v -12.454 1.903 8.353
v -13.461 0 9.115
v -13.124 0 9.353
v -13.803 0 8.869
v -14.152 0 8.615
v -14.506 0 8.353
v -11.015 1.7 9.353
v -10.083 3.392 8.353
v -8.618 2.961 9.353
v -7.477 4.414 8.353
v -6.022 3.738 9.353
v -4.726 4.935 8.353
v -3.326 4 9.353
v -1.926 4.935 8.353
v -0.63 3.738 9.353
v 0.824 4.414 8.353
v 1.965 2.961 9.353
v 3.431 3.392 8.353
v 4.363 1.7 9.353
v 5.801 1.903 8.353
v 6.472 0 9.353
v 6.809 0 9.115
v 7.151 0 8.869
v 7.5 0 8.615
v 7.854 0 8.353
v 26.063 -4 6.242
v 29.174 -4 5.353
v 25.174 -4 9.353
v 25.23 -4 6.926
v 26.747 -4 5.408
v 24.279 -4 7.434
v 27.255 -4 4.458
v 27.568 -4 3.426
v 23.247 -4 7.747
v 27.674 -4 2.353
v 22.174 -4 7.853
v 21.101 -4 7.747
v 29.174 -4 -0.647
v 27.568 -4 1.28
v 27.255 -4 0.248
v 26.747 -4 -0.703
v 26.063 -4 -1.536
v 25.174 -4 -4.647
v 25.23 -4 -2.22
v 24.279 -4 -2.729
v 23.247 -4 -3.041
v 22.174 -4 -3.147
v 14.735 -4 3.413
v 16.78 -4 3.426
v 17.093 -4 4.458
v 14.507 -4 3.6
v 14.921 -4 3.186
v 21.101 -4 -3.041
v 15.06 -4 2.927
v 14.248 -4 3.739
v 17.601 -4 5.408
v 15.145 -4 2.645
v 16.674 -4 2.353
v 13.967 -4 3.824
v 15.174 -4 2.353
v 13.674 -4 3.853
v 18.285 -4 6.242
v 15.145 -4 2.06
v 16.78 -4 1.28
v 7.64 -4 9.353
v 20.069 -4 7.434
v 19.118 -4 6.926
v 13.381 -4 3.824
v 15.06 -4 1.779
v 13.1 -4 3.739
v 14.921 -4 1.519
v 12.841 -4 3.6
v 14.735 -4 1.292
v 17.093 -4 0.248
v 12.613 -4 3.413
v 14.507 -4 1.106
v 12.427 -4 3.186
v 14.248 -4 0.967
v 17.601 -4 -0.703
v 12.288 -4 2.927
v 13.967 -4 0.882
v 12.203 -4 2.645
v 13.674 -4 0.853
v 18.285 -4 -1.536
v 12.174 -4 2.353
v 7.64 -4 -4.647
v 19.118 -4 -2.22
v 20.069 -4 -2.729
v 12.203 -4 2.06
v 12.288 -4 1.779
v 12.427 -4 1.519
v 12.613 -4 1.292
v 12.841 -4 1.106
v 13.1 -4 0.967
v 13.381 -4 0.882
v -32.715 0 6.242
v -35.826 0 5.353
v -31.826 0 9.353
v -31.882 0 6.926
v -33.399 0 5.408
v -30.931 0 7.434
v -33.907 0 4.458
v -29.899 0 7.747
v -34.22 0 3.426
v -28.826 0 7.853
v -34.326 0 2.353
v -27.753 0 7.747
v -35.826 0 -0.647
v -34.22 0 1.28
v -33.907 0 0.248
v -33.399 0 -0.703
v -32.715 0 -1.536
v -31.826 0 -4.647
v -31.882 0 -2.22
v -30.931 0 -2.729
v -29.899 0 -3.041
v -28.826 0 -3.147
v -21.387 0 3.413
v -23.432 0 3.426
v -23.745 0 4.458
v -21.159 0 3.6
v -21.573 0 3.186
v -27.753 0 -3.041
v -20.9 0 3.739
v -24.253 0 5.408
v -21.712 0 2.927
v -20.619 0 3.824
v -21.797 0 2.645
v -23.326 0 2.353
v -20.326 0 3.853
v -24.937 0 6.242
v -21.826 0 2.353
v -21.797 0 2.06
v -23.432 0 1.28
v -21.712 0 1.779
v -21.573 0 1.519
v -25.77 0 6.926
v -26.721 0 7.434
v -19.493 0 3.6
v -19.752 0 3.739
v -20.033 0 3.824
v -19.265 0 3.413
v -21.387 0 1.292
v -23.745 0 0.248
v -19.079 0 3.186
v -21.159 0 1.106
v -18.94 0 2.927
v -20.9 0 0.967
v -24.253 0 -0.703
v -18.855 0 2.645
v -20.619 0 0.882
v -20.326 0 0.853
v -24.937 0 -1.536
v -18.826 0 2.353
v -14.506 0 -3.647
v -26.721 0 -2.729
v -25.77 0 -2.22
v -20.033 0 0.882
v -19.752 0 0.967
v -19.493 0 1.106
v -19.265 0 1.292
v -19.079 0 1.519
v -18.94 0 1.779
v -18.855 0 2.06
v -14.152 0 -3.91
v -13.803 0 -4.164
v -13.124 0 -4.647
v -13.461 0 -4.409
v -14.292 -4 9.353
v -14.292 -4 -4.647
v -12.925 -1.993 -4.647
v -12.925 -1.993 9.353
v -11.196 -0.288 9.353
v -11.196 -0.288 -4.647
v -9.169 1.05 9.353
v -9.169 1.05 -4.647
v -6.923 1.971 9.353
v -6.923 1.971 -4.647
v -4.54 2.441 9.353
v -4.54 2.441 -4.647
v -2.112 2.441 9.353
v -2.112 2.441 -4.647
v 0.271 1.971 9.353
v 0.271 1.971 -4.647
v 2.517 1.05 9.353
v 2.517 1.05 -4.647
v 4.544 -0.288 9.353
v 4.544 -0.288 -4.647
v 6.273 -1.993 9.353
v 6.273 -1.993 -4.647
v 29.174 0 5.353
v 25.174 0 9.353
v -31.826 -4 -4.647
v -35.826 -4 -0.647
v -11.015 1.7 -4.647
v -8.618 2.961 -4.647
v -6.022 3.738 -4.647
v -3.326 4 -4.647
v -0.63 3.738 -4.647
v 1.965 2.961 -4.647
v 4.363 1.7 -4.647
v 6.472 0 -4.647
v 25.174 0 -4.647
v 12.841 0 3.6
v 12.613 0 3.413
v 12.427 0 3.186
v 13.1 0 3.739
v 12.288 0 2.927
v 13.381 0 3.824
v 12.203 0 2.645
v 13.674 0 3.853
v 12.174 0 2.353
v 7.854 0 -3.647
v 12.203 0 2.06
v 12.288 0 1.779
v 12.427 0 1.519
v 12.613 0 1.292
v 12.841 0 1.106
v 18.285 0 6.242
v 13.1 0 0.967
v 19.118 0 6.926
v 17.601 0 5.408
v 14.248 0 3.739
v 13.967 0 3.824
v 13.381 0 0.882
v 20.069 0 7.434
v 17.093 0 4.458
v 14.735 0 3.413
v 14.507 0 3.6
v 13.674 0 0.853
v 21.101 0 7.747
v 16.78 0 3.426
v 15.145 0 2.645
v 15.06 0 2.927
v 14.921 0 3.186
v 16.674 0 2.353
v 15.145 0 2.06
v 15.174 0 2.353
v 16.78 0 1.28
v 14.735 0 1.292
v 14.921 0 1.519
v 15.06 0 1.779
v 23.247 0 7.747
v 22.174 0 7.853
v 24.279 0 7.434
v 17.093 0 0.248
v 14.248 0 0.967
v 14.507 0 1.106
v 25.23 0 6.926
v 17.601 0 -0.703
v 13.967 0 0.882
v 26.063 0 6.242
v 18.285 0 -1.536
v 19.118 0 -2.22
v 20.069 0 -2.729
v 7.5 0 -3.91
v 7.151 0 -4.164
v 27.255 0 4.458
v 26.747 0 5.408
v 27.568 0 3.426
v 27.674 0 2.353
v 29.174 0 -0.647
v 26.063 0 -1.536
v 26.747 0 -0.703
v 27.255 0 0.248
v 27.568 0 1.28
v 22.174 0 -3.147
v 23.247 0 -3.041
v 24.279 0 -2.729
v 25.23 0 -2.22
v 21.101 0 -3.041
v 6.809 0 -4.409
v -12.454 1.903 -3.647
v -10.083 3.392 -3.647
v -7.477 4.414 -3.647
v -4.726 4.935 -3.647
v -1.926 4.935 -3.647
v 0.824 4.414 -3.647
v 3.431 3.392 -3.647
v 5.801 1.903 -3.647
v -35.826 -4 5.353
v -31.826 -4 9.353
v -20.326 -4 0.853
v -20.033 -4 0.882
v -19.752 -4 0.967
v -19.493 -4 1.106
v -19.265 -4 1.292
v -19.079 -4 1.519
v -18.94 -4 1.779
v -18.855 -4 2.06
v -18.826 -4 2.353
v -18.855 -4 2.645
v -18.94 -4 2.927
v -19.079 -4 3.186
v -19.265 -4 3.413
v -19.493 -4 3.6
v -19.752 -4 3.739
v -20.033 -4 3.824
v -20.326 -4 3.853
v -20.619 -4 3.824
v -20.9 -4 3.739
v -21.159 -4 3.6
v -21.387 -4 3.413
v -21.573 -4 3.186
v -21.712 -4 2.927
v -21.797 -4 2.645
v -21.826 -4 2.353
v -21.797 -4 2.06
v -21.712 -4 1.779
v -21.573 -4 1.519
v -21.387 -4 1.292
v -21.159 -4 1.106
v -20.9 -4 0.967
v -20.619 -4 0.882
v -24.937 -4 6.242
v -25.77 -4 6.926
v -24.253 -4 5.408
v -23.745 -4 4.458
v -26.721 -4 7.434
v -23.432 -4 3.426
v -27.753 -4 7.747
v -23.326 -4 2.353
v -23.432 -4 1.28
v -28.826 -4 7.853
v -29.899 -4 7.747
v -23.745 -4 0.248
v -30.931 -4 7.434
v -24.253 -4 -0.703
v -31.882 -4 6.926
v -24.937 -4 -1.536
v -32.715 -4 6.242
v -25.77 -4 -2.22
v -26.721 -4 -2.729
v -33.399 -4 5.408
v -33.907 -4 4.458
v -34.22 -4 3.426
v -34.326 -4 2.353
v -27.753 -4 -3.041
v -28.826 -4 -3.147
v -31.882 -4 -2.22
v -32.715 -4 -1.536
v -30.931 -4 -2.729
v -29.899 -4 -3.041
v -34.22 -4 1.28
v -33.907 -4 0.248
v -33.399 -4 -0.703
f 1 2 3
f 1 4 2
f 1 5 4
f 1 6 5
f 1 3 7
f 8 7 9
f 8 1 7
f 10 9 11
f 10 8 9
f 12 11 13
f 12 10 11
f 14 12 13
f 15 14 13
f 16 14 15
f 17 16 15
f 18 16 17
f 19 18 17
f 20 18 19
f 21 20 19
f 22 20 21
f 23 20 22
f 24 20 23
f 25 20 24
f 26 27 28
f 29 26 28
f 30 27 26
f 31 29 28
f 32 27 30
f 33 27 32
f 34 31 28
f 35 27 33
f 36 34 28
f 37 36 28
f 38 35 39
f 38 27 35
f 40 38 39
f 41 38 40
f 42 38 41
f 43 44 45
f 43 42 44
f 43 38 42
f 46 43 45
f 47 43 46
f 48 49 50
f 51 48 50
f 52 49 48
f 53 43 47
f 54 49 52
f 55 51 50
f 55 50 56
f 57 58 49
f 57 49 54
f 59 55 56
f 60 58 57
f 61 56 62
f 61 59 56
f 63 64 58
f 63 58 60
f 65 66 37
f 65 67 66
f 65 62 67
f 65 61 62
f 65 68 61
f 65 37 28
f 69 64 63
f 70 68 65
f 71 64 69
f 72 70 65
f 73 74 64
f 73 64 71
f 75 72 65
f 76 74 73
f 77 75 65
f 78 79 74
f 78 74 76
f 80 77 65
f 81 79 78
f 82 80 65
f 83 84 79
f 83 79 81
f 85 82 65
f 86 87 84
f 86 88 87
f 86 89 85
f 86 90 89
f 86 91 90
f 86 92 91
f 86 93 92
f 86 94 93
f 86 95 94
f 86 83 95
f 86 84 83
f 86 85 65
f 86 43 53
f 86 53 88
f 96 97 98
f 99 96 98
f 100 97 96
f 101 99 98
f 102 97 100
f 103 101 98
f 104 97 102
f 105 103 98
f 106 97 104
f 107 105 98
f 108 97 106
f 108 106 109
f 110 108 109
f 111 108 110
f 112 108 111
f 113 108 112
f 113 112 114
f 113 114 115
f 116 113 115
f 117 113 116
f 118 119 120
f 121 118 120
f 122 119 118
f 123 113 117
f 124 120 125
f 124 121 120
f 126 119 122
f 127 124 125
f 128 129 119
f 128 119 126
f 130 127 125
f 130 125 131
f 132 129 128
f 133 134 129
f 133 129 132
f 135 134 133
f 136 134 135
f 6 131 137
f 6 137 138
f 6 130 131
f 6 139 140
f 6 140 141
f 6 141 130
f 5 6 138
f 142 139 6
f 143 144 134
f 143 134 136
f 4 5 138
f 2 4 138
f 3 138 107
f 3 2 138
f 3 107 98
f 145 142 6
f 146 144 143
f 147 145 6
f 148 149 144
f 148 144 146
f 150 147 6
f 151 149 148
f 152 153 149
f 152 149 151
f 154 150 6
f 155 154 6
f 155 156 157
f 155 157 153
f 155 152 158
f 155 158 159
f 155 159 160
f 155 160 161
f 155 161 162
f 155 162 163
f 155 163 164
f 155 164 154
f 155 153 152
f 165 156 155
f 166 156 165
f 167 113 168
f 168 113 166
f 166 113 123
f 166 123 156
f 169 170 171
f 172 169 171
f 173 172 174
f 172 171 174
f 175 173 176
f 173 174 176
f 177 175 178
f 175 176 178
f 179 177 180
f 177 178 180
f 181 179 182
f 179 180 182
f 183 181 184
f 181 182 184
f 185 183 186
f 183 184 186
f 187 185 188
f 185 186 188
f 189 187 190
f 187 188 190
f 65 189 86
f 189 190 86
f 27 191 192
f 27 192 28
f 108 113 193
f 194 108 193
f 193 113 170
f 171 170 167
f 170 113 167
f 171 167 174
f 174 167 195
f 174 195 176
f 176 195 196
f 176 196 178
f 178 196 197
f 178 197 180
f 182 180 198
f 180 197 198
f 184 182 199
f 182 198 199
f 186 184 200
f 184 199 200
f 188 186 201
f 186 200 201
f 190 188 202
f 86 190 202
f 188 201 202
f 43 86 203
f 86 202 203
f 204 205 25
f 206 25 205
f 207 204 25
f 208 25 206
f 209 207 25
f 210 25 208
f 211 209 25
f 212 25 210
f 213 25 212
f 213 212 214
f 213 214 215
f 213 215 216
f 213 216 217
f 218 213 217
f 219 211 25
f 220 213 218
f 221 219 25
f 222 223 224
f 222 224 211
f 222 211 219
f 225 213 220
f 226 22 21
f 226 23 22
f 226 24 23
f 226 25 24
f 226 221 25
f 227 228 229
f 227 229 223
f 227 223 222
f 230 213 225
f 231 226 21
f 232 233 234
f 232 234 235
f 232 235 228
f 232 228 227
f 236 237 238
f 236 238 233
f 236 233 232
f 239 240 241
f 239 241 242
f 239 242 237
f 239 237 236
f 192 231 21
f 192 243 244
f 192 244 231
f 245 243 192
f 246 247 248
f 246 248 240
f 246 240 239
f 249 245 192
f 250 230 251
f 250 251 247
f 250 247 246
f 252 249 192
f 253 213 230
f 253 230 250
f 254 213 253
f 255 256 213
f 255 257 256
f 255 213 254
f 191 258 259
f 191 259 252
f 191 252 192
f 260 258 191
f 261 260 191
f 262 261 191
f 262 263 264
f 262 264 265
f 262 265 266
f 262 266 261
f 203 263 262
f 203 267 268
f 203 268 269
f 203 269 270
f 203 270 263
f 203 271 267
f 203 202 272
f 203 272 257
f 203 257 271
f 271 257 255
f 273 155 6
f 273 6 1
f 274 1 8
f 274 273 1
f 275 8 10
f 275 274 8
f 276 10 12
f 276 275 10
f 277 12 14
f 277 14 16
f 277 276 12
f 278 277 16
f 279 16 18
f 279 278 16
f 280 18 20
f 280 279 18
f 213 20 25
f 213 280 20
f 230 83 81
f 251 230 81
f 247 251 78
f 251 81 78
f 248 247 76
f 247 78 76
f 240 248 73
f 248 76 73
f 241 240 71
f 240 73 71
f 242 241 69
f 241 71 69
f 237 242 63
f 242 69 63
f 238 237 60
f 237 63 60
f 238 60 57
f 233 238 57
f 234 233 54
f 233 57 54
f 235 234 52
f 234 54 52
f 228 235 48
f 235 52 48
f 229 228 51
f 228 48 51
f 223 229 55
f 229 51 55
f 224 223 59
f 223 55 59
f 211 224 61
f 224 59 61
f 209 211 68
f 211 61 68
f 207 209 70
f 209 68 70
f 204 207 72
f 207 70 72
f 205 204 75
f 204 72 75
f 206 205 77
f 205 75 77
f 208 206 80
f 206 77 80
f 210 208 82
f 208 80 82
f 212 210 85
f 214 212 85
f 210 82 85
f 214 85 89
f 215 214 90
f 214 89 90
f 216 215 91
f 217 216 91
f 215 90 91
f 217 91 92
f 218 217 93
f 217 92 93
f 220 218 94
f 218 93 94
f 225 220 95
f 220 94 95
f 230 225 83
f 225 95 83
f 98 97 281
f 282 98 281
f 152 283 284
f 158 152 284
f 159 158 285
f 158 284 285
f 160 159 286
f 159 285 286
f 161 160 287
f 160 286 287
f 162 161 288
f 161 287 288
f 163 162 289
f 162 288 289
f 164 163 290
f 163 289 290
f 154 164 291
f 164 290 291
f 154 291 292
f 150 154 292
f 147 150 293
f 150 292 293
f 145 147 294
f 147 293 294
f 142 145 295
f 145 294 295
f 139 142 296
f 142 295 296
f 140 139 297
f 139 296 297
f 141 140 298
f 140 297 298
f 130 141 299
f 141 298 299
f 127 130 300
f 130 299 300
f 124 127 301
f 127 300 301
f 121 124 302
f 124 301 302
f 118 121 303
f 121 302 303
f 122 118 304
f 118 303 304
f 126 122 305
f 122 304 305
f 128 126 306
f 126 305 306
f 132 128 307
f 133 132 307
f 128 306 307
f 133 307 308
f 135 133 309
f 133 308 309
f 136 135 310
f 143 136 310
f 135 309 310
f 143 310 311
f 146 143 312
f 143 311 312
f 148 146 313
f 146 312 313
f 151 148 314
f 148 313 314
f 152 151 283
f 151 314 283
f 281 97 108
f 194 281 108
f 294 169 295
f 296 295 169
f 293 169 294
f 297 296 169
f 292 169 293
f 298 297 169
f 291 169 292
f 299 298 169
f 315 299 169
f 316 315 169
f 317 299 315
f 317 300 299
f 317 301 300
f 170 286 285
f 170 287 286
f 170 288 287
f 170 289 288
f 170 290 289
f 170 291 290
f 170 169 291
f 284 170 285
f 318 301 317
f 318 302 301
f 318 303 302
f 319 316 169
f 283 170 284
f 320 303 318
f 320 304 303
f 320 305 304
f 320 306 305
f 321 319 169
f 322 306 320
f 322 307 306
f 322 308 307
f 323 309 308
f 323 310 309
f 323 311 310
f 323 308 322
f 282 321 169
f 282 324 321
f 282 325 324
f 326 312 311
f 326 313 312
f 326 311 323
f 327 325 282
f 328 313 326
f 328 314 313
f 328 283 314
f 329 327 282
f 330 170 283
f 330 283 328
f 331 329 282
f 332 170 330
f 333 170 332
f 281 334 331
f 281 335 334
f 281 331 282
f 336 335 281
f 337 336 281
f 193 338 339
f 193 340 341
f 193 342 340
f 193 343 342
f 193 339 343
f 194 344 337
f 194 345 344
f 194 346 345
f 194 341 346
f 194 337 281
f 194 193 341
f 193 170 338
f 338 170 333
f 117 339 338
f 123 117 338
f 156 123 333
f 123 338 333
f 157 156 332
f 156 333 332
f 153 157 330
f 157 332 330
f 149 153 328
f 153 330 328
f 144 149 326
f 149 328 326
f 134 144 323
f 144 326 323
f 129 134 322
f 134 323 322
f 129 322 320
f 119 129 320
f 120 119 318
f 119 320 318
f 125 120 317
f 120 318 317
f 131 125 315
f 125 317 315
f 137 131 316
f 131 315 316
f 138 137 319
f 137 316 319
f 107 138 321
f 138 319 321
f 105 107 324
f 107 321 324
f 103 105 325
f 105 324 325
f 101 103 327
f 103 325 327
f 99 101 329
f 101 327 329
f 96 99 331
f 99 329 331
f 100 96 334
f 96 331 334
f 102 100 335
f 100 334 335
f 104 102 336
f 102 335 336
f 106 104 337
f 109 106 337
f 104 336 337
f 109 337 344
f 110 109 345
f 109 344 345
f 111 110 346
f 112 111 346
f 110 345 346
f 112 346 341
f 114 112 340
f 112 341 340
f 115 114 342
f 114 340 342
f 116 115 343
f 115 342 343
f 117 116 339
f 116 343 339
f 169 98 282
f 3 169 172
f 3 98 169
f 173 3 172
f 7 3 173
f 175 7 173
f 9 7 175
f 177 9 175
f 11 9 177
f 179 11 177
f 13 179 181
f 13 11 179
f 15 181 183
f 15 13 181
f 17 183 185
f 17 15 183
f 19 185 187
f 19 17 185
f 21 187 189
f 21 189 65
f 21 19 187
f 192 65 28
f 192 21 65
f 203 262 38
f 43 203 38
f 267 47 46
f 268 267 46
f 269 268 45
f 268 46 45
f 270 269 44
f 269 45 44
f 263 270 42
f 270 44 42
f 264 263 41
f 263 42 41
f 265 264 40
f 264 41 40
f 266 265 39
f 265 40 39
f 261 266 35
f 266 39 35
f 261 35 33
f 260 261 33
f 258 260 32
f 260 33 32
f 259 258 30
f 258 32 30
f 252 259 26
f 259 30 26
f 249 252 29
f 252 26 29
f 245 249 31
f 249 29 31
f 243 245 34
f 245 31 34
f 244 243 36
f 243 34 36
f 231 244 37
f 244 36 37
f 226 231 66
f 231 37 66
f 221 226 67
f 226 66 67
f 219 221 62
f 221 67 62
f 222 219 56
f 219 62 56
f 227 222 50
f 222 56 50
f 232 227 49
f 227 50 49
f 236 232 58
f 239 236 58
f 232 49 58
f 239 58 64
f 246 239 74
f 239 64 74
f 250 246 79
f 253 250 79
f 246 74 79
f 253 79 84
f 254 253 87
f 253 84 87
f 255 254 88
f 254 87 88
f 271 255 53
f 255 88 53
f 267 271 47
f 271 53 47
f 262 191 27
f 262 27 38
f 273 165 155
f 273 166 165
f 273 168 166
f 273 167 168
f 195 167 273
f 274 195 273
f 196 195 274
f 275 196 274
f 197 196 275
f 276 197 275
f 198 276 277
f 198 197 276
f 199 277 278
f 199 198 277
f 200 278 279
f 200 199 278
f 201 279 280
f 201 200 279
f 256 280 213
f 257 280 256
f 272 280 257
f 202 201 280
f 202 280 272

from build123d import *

# Parameters (mm, degrees)
ESQUISSE2_W             = 65
ESQUISSE2_H             = 14
BOSS_EXTRU_1_DEPTH      = 4
ESQUISSE3_R             = 5.5
ESQUISSE3_R_2           = 1.5
ENL_V_MAT_EXTRU_1_DEPTH = 4
BOSS_EXTRU_3_DEPTH      = 14
ESQUISSE7_R             = 12.5
ENL_V_MAT_EXTRU_4_DEPTH = 39.788005272
CHANFREIN1_SIZE         = 4
CHANFREIN2_SIZE         = 1


with BuildPart() as part:
    # Esquisse2 → Boss.-Extru.1 (new body)
    with BuildSketch(Plane(origin=(0, 0, 0), x_dir=(1, 0, 0), z_dir=(0, 1, 0))):
        with Locations((-3.326098768, -2.352831094)):
            Rectangle(ESQUISSE2_W, ESQUISSE2_H)
    extrude(amount=-BOSS_EXTRU_1_DEPTH)

    # Esquisse3 → Enlèv. mat.-Extru.1 (cut)
    with BuildSketch(Plane.XZ.offset(4)):
        with Locations(Location((-28.826098768, 2.352831094, 0), (0, 0, 270))):
            Circle(ESQUISSE3_R)
        with Locations(Location((22.173901232, 2.352831094, 0), (0, 0, 270))):
            Circle(ESQUISSE3_R)
        with Locations(Location((-20.326098768, 2.352831094, 0), (0, 0, 270))):
            Circle(ESQUISSE3_R_2)
        with Locations(Location((13.673901232, 2.352831094, 0), (0, 0, 270))):
            Circle(ESQUISSE3_R_2)
    extrude(amount=-ENL_V_MAT_EXTRU_1_DEPTH, mode=Mode.SUBTRACT)

    # Esquisse5 → Boss.-Extru.3 (add)
    with BuildSketch(Plane(origin=(0, 0, -4.647168906), x_dir=(-1, 0, 0), z_dir=(0, 0, -1))):
        with BuildLine():
            Line((-10.421628317, -4), (17.073825853, -4))
            ThreePointArc((17.073825853, -4), (3.326098768, 5), (-10.421628317, -4))
        make_face()
    extrude(amount=-BOSS_EXTRU_3_DEPTH)

    # Esquisse7 → Enlèv. mat.-Extru.4 (cut, through all)
    with BuildSketch(Plane(origin=(0, 0, -4.647168906), x_dir=(-1, 0, 0), z_dir=(0, 0, -1))):
        with Locations((3.326098768, -10)):
            Circle(ESQUISSE7_R)
    extrude(amount=-ENL_V_MAT_EXTRU_4_DEPTH, mode=Mode.SUBTRACT)

    # Chanfrein1
    chanfrein1_edges = [part.edges().sort_by_distance(p)[0] for p in [
        (-35.826098768, -2, -4.647168906),
        (29.173901232, -2, -4.647168906),
        (29.173901232, -2, 9.352831094),
        (-35.826098768, -2, 9.352831094),
    ]]
    chamfer(chanfrein1_edges, length=CHANFREIN1_SIZE)

    # Chanfrein2
    chanfrein2_edges = [part.edges().sort_by_distance(p)[0] for p in [
        (-3.326098768, 5, 9.352831094),
        (-3.326098768, 5, -4.647168906),
    ]]
    chamfer(chanfrein2_edges, length=CHANFREIN2_SIZE)


solid = part.part
